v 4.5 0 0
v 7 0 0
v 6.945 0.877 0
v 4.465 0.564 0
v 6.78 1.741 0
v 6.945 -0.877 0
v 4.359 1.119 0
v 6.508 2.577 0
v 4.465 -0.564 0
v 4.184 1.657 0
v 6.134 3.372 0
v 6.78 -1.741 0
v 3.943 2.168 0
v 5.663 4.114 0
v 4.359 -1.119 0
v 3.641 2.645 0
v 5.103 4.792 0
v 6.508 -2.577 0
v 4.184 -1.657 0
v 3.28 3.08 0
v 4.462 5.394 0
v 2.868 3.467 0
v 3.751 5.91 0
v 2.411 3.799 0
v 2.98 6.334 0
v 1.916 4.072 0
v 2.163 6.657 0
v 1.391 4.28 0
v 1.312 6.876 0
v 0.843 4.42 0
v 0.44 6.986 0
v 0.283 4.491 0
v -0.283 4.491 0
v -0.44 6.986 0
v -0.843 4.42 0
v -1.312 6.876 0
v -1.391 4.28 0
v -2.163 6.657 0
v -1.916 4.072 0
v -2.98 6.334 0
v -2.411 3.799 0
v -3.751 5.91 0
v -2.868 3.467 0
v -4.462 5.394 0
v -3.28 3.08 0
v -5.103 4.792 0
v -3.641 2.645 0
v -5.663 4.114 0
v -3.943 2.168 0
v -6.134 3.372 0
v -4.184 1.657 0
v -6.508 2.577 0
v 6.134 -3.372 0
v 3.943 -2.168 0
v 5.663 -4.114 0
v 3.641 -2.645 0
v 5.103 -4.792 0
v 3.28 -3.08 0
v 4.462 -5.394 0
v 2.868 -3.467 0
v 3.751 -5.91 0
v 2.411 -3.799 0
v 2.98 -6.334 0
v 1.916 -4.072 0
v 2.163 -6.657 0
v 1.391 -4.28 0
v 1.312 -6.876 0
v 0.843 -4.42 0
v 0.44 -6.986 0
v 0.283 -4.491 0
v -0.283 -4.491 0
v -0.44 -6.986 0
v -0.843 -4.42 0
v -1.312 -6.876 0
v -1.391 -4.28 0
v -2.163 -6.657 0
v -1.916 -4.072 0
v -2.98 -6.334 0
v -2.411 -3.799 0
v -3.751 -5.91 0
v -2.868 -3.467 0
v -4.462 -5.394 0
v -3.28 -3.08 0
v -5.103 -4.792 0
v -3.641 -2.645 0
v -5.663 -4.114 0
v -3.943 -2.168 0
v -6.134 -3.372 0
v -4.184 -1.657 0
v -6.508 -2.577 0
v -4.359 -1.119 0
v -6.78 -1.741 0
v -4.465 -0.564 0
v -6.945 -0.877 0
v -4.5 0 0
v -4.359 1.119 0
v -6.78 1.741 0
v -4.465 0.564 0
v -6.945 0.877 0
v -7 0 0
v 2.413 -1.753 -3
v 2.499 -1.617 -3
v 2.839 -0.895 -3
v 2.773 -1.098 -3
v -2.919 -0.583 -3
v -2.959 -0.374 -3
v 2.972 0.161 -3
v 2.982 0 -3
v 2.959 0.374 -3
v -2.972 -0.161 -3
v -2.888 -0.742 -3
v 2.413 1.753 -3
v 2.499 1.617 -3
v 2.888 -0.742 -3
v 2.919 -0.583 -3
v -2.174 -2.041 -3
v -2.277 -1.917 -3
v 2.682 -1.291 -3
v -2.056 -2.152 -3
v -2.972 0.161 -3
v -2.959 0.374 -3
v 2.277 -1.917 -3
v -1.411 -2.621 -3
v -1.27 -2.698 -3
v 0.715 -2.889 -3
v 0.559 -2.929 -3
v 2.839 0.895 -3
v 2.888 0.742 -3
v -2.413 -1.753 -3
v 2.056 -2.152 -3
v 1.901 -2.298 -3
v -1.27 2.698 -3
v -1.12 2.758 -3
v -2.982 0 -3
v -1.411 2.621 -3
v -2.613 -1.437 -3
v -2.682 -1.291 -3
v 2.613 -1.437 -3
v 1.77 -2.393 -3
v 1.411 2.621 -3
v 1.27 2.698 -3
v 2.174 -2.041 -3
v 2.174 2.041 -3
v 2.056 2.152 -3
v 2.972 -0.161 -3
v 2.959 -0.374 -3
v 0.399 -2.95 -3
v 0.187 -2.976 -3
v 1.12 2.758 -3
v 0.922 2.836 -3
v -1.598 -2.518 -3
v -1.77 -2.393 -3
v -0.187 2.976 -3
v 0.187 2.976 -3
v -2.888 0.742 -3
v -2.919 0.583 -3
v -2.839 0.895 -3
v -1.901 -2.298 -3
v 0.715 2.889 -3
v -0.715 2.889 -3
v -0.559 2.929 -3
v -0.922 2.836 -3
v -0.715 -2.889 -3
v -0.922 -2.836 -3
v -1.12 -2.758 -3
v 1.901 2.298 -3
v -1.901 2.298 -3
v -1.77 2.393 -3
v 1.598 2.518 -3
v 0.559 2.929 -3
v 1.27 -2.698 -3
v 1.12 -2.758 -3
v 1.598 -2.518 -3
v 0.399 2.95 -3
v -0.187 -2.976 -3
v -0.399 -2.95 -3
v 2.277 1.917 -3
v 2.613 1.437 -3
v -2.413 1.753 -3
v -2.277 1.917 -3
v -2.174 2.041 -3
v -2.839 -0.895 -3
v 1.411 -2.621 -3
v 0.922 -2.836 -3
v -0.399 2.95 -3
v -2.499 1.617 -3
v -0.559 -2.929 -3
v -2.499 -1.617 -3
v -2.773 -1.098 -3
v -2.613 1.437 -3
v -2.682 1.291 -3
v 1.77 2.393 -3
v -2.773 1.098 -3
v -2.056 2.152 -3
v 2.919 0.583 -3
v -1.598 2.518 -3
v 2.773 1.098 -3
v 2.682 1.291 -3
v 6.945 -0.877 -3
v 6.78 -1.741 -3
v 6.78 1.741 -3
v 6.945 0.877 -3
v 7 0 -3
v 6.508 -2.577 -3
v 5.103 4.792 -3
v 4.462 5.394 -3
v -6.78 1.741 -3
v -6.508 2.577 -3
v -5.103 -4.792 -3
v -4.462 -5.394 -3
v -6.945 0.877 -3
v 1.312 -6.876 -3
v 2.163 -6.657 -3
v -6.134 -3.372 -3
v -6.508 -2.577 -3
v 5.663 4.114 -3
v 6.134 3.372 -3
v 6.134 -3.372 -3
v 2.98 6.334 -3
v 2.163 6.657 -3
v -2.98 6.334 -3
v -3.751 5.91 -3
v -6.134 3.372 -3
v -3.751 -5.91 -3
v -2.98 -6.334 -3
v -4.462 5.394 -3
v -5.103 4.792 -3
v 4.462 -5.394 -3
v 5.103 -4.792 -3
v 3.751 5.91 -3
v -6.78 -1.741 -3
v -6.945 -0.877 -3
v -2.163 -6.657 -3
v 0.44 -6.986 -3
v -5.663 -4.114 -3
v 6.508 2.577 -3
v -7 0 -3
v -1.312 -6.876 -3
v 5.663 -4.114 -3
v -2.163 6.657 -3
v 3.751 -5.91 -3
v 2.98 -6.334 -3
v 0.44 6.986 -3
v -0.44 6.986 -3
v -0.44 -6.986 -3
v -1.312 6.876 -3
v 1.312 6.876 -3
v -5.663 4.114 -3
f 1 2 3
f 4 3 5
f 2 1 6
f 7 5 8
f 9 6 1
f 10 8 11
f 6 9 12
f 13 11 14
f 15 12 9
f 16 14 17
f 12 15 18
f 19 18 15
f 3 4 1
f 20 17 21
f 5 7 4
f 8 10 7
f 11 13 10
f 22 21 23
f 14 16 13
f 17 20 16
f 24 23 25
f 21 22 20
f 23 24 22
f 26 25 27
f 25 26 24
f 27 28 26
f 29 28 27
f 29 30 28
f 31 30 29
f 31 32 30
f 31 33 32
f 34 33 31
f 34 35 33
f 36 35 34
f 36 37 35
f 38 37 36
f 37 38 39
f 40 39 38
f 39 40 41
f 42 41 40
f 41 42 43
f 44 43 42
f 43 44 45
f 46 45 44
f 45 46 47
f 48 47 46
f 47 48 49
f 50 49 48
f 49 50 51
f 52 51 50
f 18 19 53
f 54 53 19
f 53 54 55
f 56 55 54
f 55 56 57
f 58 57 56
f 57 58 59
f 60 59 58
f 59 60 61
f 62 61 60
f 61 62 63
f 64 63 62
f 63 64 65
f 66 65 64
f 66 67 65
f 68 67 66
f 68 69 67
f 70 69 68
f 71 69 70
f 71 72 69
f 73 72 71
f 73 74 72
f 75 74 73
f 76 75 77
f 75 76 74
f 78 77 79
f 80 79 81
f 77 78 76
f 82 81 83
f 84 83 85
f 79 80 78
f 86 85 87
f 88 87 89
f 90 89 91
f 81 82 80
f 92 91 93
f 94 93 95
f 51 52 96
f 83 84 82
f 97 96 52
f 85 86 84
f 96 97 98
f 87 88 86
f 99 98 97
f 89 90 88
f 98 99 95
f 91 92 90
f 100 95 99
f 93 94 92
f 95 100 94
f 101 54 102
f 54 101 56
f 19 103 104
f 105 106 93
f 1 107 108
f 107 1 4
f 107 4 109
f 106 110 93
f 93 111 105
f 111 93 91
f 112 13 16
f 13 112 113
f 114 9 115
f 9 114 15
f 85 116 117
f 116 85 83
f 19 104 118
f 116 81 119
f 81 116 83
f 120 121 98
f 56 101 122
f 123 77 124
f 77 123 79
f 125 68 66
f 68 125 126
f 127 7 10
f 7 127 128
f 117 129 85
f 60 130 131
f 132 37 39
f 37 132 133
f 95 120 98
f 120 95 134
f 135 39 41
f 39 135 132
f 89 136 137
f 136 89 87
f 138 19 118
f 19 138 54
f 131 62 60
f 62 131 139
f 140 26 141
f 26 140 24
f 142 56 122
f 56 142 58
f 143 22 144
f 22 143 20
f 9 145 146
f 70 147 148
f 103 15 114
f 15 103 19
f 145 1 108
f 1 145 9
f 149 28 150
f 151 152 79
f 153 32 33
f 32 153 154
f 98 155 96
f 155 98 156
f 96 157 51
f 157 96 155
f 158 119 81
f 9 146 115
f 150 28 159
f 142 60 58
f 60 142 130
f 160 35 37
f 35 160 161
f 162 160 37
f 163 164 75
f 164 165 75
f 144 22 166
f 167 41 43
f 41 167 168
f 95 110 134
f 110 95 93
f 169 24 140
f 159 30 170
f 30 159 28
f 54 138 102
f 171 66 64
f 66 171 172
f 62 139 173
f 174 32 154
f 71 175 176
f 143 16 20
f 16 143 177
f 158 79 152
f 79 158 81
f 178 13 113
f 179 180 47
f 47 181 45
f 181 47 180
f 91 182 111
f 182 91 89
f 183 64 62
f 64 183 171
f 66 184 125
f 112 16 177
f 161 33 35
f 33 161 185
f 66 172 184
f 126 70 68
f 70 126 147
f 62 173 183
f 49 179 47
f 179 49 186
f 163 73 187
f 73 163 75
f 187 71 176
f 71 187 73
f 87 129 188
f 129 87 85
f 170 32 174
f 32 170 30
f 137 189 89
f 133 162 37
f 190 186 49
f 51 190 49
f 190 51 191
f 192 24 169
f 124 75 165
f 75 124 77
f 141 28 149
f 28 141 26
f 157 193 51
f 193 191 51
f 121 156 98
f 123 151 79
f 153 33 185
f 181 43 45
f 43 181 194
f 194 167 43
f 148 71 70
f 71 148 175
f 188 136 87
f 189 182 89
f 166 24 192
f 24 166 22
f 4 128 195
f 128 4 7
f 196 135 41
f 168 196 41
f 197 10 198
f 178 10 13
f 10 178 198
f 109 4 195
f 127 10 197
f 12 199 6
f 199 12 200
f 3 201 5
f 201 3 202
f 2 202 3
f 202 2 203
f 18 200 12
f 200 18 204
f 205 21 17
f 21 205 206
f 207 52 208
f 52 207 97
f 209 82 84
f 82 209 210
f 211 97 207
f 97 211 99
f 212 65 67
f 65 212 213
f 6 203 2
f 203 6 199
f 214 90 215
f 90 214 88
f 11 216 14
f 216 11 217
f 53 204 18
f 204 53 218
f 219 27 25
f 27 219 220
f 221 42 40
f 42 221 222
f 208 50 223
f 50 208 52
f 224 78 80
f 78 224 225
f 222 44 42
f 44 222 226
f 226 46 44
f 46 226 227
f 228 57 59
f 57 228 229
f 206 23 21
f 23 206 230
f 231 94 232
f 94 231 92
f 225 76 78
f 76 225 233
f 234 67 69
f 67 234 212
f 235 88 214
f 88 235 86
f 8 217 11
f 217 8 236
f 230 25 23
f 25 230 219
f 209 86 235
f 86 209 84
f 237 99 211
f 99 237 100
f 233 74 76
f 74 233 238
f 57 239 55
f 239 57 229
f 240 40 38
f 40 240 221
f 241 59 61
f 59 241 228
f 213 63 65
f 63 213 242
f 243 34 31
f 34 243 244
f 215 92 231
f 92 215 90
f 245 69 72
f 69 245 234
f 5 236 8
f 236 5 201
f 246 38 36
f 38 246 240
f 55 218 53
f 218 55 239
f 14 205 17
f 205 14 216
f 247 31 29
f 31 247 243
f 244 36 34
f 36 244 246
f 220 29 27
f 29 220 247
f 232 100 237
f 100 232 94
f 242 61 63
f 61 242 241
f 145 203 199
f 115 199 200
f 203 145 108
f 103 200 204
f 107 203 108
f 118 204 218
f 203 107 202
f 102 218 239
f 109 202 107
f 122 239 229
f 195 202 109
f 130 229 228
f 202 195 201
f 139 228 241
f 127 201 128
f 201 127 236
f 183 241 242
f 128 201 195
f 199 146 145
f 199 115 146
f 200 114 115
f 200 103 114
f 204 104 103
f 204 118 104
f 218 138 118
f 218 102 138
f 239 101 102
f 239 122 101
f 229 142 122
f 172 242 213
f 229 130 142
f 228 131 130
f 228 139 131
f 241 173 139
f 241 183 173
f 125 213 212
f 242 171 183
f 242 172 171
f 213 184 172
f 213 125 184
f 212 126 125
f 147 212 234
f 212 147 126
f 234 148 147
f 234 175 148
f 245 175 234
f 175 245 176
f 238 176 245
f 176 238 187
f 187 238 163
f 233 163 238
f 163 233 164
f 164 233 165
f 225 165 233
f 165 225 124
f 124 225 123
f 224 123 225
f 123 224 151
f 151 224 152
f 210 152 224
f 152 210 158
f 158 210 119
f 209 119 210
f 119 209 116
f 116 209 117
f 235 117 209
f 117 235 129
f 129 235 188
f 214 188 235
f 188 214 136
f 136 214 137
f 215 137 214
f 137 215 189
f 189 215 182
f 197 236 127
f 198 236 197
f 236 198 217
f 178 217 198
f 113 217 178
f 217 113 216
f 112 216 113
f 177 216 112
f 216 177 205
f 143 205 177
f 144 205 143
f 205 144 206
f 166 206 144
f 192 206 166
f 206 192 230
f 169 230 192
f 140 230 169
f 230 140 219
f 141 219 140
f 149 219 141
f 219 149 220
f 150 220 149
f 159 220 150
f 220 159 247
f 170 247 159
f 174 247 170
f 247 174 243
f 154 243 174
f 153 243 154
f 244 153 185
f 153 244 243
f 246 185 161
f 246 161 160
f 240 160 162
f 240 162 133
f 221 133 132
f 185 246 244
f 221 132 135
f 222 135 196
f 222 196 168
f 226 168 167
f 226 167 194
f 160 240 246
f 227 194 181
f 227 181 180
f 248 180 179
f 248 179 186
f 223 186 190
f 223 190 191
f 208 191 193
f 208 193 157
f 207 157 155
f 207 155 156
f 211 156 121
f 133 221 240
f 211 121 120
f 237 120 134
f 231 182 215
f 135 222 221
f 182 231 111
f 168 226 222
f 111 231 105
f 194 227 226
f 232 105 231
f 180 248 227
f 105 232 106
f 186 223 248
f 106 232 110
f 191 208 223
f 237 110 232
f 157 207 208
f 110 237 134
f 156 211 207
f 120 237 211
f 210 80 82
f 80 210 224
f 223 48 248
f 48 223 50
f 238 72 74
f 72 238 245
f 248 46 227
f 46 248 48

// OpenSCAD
$fn = 50;


difference() {
	union() {
		translate(v = [0, 0, -3.0000000000]) {
			cylinder(h = 3, r = 7.0000000000);
		}
	}
	union() {
		translate(v = [0, 0, 0]) {
			rotate(a = [0, 0, 0]) {
				difference() {
					union() {
						translate(v = [0, 0, -3.0000000000]) {
							cylinder(h = 3, r = 2.2500000000);
						}
						translate(v = [0, 0, -4.2000000000]) {
							cylinder(h = 4.2000000000, r1 = 2.3750000000, r2 = 4.5000000000);
						}
						translate(v = [0, 0, -3.0000000000]) {
							cylinder(h = 3, r = 2.3750000000);
						}
						translate(v = [0, 0, -3.0000000000]) {
							cylinder(h = 3, r = 2.2500000000);
						}
					}
					union();
				}
			}
		}
	}
}
